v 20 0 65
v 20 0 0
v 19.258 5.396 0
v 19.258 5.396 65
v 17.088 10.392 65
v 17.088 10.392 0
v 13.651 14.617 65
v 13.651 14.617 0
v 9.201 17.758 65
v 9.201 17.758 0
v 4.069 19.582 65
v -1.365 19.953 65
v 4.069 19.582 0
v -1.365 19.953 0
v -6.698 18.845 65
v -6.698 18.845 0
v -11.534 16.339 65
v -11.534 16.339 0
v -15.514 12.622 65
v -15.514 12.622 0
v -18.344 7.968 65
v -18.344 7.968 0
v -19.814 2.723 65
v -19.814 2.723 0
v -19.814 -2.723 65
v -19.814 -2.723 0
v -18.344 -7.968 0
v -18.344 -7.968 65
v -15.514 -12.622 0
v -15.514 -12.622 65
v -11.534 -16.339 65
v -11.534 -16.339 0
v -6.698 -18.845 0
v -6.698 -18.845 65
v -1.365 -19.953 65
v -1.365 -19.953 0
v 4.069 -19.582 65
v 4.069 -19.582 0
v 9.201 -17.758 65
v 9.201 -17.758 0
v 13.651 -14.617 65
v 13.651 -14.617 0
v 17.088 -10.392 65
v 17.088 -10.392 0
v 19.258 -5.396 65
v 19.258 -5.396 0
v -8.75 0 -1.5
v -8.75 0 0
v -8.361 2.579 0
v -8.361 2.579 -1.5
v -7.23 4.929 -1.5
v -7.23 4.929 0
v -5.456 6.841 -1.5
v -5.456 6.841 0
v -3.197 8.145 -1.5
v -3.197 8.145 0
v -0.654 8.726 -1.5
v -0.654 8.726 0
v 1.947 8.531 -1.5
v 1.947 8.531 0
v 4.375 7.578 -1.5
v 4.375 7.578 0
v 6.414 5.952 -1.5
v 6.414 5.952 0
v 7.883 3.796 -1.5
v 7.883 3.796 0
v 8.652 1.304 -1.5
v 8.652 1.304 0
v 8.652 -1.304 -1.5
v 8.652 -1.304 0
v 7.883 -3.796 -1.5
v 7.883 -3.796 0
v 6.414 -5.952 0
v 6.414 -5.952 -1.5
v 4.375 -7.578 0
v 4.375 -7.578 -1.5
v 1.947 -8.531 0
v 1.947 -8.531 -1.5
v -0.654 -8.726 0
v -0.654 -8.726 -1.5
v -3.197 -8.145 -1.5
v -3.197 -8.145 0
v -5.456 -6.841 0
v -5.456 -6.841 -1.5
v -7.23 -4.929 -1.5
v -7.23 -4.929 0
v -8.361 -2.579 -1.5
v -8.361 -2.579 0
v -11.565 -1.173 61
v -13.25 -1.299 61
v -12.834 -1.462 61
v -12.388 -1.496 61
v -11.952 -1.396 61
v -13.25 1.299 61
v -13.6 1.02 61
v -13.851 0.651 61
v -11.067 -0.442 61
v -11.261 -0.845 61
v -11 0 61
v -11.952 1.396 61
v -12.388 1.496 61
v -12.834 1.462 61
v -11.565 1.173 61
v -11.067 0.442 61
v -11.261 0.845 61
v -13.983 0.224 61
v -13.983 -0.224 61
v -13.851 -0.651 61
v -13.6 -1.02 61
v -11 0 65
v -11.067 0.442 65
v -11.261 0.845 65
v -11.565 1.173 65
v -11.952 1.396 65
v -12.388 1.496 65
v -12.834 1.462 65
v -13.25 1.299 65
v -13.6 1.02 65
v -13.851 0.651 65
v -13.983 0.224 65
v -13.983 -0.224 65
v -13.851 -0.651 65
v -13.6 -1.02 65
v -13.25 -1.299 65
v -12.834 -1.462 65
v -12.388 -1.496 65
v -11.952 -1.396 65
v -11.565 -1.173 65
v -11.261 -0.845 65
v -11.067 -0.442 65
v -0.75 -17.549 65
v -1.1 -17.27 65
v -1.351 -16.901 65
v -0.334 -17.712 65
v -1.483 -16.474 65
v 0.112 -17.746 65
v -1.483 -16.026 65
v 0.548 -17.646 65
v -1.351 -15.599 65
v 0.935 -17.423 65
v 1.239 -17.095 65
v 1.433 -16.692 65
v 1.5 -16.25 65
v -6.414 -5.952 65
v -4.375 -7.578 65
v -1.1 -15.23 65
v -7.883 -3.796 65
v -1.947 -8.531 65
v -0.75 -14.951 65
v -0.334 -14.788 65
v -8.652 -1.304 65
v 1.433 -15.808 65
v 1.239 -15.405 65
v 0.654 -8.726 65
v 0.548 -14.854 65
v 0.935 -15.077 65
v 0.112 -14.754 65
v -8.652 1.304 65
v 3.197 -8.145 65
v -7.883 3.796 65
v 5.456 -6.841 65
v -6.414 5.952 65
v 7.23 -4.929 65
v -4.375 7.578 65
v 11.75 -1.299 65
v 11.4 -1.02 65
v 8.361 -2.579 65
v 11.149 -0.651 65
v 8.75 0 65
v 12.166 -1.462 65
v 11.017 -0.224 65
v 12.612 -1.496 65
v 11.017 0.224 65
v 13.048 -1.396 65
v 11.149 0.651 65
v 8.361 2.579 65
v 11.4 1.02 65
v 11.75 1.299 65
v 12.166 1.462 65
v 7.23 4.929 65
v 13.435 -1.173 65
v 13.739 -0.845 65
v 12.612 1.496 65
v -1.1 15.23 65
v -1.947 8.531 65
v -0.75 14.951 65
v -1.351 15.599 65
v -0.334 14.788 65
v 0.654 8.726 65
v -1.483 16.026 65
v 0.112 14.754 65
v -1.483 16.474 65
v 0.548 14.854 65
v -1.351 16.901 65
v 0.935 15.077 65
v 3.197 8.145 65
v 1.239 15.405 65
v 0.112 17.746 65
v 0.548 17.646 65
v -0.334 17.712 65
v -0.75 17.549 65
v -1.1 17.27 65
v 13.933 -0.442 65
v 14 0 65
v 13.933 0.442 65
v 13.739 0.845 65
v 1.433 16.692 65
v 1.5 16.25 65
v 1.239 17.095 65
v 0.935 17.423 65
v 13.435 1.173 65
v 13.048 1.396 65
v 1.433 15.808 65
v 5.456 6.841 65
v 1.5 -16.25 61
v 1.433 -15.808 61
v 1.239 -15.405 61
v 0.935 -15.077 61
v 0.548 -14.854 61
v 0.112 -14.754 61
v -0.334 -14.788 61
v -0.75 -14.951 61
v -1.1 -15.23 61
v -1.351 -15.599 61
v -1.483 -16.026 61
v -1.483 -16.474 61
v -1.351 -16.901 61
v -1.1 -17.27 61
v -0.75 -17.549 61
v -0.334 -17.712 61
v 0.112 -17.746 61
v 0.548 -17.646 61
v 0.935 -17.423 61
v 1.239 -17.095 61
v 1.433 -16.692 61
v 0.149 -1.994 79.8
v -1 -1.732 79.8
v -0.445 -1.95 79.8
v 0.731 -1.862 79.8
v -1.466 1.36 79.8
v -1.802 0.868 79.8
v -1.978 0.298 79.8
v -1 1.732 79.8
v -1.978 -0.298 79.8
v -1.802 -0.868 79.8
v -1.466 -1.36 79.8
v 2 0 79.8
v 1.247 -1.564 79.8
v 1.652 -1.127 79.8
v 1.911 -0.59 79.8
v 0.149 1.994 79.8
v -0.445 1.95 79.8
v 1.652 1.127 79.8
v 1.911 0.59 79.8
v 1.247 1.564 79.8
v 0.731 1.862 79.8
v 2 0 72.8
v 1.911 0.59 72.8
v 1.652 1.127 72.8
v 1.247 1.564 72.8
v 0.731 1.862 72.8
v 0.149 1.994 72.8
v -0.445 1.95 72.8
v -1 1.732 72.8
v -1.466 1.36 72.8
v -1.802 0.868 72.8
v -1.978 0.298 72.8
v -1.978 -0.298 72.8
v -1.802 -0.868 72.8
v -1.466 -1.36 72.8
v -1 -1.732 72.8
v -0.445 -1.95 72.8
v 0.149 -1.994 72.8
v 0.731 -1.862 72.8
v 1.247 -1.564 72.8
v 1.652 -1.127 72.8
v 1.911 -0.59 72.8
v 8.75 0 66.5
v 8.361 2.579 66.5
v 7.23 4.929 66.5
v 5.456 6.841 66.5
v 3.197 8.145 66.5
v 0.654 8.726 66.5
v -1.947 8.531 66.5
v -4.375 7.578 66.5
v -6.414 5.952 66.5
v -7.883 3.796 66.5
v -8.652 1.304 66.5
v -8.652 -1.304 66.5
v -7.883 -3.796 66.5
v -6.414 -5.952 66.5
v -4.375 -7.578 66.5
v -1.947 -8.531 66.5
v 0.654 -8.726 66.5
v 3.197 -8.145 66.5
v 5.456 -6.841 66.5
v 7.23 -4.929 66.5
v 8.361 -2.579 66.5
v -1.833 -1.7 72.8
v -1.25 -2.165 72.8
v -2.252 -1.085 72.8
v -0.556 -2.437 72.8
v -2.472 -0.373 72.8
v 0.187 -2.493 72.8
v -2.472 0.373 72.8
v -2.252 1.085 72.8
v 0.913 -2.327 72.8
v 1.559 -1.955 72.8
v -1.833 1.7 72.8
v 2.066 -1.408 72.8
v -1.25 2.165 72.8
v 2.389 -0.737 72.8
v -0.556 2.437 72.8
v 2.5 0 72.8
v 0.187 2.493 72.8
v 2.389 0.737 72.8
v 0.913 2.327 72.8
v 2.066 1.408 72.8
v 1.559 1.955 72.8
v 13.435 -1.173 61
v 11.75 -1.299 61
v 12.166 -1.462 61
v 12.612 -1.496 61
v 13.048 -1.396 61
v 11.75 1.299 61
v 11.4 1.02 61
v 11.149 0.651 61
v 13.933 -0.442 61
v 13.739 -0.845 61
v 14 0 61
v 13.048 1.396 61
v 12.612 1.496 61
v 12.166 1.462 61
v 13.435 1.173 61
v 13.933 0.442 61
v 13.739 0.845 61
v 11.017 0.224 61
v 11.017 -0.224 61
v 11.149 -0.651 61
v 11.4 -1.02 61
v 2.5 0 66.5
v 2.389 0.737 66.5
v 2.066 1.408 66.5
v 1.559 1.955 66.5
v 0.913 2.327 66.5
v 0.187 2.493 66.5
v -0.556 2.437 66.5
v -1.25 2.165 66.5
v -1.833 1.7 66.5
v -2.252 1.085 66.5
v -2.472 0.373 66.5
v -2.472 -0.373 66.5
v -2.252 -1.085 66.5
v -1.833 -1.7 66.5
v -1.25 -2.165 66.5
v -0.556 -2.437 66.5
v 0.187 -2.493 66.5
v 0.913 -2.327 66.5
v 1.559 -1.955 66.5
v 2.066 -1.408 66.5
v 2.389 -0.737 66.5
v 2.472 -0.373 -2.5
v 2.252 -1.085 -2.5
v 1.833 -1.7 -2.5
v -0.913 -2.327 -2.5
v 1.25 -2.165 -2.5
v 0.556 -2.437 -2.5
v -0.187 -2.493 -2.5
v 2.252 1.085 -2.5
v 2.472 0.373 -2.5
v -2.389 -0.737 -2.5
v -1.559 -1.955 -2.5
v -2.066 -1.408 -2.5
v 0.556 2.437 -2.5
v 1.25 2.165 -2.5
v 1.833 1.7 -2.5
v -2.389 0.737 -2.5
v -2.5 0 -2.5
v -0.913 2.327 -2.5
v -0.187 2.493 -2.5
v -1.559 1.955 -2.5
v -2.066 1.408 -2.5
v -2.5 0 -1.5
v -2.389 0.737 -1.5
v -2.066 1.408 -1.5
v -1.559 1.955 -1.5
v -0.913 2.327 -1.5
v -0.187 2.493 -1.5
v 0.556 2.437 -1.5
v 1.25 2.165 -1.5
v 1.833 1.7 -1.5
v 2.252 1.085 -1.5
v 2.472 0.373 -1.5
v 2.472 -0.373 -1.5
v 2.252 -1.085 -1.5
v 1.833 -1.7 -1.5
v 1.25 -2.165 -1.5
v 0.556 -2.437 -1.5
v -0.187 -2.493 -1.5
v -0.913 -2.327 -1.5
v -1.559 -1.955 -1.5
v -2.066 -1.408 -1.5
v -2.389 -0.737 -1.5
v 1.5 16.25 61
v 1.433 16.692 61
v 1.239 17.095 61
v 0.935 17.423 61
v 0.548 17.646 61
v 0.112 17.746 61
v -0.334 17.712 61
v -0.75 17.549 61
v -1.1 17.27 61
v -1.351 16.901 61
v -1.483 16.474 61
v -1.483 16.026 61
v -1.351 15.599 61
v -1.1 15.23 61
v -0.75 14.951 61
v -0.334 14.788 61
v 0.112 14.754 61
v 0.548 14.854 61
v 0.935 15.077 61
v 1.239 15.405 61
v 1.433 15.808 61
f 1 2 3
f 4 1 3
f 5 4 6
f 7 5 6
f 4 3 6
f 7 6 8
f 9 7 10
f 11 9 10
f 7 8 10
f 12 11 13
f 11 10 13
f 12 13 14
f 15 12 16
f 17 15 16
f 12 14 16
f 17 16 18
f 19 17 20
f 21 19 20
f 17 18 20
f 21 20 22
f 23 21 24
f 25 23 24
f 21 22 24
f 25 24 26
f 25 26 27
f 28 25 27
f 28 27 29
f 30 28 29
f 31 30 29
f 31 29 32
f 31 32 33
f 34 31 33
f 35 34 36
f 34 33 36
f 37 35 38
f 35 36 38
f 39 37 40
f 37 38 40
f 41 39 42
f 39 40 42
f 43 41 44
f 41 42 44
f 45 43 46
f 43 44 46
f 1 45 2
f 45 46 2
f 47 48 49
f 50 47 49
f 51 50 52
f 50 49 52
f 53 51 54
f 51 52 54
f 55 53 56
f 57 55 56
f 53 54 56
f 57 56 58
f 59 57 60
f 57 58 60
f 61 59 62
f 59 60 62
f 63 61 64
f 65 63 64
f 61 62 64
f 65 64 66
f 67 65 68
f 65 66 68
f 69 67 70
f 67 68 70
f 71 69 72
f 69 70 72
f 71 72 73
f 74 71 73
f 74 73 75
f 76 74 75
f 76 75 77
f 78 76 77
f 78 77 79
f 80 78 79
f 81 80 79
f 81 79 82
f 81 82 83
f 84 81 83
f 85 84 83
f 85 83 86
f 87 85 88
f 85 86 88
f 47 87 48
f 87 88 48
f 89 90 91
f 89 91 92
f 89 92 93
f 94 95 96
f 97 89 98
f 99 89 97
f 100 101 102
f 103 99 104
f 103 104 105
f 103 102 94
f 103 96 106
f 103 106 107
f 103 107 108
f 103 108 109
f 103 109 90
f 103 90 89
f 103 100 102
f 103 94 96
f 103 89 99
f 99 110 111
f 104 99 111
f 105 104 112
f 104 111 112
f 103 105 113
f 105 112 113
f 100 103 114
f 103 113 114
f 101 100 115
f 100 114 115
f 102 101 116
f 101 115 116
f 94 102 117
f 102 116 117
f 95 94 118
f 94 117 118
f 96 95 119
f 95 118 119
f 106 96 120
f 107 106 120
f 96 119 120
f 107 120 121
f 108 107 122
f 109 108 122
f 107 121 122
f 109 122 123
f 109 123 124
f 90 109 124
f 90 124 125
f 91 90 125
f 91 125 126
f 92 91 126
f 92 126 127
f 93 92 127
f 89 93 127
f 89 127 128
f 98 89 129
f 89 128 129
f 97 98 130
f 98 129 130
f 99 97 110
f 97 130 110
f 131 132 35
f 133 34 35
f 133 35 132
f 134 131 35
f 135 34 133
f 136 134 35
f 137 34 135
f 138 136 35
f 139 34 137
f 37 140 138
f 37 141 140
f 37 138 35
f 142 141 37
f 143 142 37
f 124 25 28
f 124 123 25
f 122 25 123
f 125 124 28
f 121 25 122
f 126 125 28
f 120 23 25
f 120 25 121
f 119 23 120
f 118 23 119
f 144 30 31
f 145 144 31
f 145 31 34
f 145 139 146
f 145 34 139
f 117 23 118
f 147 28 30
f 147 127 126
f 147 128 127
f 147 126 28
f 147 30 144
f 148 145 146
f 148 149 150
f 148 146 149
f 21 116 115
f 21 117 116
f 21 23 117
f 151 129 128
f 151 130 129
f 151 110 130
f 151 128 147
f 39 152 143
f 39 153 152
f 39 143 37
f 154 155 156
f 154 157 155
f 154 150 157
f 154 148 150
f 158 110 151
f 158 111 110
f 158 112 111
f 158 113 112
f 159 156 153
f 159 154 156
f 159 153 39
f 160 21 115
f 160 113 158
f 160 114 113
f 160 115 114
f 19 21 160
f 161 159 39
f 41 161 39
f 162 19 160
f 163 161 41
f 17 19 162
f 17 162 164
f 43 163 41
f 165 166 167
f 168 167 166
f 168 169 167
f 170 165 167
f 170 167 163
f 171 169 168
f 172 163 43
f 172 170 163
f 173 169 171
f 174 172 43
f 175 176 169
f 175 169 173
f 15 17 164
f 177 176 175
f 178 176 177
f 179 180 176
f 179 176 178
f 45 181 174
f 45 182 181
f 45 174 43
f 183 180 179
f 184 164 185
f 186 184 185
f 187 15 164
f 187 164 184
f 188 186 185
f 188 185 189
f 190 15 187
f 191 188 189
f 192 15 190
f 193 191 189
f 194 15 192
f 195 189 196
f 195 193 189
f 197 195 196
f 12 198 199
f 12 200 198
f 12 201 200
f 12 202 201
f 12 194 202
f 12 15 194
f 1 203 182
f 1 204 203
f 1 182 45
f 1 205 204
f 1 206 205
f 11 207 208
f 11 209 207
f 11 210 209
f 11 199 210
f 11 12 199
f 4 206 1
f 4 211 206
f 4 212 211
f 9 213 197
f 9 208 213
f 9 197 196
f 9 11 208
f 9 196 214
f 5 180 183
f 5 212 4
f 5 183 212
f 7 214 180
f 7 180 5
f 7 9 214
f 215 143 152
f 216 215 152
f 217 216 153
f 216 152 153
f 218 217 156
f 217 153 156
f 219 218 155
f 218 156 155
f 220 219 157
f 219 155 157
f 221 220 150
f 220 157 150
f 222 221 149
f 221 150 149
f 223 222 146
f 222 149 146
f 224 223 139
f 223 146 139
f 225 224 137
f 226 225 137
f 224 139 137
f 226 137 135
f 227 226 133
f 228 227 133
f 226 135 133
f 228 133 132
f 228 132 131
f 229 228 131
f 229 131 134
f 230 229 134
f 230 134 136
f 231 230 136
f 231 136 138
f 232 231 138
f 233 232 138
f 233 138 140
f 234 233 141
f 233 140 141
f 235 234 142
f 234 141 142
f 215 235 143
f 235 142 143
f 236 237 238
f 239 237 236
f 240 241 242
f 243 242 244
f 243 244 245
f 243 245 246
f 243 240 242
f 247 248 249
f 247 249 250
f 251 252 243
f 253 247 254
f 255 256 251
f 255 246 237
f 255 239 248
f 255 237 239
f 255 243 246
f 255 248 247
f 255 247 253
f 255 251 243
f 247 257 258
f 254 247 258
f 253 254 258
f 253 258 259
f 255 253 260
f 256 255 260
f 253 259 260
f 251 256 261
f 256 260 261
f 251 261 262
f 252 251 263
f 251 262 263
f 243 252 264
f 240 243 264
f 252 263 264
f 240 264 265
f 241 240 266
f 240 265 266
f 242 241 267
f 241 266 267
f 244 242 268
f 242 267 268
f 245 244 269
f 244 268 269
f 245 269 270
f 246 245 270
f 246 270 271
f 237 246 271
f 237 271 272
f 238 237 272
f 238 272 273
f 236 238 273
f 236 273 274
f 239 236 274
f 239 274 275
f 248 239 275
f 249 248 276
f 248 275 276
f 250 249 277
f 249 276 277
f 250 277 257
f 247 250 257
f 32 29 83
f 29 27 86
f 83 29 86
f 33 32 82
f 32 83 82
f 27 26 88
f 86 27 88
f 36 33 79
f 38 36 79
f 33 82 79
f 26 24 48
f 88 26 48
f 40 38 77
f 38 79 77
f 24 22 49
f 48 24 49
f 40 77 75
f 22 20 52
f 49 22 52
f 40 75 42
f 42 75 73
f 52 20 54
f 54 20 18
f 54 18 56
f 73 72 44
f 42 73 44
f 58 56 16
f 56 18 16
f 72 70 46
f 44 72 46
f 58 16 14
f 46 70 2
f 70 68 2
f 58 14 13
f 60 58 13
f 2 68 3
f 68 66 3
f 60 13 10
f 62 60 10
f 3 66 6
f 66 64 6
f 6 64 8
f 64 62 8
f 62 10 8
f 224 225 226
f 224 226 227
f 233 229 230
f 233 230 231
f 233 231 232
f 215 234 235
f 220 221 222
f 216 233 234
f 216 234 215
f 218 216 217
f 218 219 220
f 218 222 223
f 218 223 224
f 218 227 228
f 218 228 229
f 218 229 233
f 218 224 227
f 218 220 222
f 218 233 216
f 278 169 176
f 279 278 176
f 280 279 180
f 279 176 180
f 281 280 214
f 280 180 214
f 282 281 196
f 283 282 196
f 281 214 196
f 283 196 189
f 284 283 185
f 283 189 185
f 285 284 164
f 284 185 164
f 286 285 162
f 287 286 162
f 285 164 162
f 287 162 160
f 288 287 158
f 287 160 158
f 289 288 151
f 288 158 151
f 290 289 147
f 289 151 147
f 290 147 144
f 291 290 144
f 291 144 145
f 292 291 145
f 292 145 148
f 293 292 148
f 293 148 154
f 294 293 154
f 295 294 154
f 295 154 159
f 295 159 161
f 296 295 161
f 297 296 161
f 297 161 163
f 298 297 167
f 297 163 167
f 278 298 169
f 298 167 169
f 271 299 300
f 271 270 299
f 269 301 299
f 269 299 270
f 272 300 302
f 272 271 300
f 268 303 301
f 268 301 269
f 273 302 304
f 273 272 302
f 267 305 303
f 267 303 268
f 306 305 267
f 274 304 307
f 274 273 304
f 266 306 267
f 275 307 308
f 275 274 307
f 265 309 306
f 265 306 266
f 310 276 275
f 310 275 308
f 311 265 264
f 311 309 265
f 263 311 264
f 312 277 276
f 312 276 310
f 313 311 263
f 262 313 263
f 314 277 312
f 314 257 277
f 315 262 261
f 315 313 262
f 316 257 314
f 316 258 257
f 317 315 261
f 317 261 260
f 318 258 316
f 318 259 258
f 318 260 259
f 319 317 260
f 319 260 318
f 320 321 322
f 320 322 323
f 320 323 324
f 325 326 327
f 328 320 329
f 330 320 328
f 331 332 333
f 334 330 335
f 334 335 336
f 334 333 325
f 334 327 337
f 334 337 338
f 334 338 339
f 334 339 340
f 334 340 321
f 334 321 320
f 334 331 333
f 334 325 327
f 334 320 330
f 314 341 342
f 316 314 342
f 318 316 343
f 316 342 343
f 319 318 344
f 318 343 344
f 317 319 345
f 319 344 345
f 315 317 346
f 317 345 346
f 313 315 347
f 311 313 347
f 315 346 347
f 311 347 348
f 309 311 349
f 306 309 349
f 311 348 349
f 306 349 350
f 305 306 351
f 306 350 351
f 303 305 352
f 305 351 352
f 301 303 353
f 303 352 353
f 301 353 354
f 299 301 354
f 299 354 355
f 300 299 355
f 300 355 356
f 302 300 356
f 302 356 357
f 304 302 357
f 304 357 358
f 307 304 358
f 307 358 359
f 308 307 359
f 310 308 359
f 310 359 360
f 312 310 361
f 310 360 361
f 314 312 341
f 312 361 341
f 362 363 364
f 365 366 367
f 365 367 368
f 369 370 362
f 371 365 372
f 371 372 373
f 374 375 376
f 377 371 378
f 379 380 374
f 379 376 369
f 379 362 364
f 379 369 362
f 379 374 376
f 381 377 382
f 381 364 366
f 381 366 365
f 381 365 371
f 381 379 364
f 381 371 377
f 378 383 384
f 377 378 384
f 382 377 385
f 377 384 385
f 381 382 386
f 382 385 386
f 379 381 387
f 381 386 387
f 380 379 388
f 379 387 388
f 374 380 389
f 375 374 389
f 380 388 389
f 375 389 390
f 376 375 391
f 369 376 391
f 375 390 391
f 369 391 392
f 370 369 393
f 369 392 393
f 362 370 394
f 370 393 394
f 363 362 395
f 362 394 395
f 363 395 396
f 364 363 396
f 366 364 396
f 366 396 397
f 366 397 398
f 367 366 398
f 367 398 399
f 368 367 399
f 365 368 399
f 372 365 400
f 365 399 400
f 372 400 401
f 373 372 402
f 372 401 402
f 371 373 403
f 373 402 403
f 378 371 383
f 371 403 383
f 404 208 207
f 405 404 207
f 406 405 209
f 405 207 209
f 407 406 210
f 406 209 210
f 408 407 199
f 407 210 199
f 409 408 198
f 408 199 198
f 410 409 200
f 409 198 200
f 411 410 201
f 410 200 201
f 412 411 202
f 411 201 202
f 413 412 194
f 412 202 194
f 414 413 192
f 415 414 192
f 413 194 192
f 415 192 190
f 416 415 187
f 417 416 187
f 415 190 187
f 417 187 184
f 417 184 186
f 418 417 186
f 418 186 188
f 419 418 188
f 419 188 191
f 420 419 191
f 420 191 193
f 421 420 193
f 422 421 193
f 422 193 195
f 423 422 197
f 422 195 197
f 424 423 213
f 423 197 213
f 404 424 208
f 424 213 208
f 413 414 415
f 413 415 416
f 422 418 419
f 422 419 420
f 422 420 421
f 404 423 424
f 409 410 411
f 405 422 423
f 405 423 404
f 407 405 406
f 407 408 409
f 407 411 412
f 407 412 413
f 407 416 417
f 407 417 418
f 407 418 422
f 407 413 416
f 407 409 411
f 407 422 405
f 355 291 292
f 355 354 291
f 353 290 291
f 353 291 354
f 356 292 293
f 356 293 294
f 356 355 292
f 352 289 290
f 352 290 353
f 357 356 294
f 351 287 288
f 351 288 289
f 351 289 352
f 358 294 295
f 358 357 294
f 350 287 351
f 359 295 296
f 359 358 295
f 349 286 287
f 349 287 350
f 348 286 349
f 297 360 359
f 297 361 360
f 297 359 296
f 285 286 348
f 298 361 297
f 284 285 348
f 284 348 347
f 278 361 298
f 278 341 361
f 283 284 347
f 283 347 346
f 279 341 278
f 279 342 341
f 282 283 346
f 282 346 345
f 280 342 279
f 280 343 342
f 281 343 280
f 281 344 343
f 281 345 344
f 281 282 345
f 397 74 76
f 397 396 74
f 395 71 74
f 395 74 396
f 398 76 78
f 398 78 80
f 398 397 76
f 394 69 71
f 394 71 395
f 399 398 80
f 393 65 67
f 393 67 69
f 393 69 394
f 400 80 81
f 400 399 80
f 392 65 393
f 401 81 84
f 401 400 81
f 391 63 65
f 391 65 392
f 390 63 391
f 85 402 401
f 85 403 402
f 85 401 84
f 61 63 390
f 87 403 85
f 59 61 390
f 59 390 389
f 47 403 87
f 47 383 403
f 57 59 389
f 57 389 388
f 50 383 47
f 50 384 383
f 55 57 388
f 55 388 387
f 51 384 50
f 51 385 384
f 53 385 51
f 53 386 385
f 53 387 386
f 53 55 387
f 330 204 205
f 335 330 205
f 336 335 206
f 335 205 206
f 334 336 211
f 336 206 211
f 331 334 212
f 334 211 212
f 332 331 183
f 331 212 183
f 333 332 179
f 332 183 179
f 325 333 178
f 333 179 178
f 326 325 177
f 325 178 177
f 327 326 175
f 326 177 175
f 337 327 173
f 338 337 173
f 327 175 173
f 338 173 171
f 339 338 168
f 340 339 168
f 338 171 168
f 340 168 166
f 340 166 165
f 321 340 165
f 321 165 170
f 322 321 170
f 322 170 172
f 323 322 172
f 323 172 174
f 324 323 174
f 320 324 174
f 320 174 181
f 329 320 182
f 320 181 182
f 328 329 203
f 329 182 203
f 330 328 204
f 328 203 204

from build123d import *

# Parameters (mm, degrees)
SKETCH_3_R          = 20
EXTRUDE_1_DEPTH     = 65
SKETCH_4_R          = 8.75
EXTRUDE_2_DEPTH     = 1.5
SKETCH_6_R          = 8.75
EXTRUDE_3_DEPTH     = 1.5
SKETCH_7_R          = 2.5
EXTRUDE_4_DEPTH     = 6.3
SKETCH_8_R          = 2
EXTRUDE_5_DEPTH     = 7
SKETCH_10_R         = 2.5
EXTRUDE_6_DEPTH     = 1
SKETCH_11_R         = 1.5
CUT_EXTRUDE_1_DEPTH = 4
SKETCH_12_R         = 1.5
CUT_EXTRUDE_2_DEPTH = 4


with BuildPart() as part:
    # 草圖3 → 填料-伸長1 (new body)
    with BuildSketch(Plane.XY):
        Circle(SKETCH_3_R)
    extrude(amount=EXTRUDE_1_DEPTH)

    # 草圖4 → 填料-伸長2 (add)
    with BuildSketch(Plane(origin=(0, 0, 0), x_dir=(-1, 0, 0), z_dir=(0, 0, -1))):
        Circle(SKETCH_4_R)
    extrude(amount=EXTRUDE_2_DEPTH)

    # 草圖6 → 填料-伸長3 (add)
    with BuildSketch(Plane.XY.offset(65)):
        Circle(SKETCH_6_R)
    extrude(amount=EXTRUDE_3_DEPTH)

    # 草圖7 → 填料-伸長4 (add)
    with BuildSketch(Plane.XY.offset(66.5)):
        Circle(SKETCH_7_R)
    extrude(amount=EXTRUDE_4_DEPTH)

    # 草圖8 → 填料-伸長5 (add)
    with BuildSketch(Plane.XY.offset(72.8)):
        Circle(SKETCH_8_R)
    extrude(amount=EXTRUDE_5_DEPTH)

    # 草圖10 → 填料-伸長6 (add)
    with BuildSketch(Plane(origin=(0, 0, -1.5), x_dir=(-1, 0, 0), z_dir=(0, 0, -1))):
        Circle(SKETCH_10_R)
    extrude(amount=EXTRUDE_6_DEPTH)

    # 草圖11 → 除料-伸長1 (cut)
    with BuildSketch(Plane.XY.offset(65)):
        with Locations((-12.5, 0)):
            Circle(SKETCH_11_R)
        with Locations((12.5, 0)):
            Circle(SKETCH_11_R)
    extrude(amount=-CUT_EXTRUDE_1_DEPTH, mode=Mode.SUBTRACT)

    # 草圖12 → 除料-伸長2 (cut)
    with BuildSketch(Plane.XY.offset(65)):
        with Locations((0, 16.25)):
            Circle(SKETCH_12_R)
        with Locations((0, -16.25)):
            Circle(SKETCH_12_R)
    extrude(amount=-CUT_EXTRUDE_2_DEPTH, mode=Mode.SUBTRACT)


solid = part.part
